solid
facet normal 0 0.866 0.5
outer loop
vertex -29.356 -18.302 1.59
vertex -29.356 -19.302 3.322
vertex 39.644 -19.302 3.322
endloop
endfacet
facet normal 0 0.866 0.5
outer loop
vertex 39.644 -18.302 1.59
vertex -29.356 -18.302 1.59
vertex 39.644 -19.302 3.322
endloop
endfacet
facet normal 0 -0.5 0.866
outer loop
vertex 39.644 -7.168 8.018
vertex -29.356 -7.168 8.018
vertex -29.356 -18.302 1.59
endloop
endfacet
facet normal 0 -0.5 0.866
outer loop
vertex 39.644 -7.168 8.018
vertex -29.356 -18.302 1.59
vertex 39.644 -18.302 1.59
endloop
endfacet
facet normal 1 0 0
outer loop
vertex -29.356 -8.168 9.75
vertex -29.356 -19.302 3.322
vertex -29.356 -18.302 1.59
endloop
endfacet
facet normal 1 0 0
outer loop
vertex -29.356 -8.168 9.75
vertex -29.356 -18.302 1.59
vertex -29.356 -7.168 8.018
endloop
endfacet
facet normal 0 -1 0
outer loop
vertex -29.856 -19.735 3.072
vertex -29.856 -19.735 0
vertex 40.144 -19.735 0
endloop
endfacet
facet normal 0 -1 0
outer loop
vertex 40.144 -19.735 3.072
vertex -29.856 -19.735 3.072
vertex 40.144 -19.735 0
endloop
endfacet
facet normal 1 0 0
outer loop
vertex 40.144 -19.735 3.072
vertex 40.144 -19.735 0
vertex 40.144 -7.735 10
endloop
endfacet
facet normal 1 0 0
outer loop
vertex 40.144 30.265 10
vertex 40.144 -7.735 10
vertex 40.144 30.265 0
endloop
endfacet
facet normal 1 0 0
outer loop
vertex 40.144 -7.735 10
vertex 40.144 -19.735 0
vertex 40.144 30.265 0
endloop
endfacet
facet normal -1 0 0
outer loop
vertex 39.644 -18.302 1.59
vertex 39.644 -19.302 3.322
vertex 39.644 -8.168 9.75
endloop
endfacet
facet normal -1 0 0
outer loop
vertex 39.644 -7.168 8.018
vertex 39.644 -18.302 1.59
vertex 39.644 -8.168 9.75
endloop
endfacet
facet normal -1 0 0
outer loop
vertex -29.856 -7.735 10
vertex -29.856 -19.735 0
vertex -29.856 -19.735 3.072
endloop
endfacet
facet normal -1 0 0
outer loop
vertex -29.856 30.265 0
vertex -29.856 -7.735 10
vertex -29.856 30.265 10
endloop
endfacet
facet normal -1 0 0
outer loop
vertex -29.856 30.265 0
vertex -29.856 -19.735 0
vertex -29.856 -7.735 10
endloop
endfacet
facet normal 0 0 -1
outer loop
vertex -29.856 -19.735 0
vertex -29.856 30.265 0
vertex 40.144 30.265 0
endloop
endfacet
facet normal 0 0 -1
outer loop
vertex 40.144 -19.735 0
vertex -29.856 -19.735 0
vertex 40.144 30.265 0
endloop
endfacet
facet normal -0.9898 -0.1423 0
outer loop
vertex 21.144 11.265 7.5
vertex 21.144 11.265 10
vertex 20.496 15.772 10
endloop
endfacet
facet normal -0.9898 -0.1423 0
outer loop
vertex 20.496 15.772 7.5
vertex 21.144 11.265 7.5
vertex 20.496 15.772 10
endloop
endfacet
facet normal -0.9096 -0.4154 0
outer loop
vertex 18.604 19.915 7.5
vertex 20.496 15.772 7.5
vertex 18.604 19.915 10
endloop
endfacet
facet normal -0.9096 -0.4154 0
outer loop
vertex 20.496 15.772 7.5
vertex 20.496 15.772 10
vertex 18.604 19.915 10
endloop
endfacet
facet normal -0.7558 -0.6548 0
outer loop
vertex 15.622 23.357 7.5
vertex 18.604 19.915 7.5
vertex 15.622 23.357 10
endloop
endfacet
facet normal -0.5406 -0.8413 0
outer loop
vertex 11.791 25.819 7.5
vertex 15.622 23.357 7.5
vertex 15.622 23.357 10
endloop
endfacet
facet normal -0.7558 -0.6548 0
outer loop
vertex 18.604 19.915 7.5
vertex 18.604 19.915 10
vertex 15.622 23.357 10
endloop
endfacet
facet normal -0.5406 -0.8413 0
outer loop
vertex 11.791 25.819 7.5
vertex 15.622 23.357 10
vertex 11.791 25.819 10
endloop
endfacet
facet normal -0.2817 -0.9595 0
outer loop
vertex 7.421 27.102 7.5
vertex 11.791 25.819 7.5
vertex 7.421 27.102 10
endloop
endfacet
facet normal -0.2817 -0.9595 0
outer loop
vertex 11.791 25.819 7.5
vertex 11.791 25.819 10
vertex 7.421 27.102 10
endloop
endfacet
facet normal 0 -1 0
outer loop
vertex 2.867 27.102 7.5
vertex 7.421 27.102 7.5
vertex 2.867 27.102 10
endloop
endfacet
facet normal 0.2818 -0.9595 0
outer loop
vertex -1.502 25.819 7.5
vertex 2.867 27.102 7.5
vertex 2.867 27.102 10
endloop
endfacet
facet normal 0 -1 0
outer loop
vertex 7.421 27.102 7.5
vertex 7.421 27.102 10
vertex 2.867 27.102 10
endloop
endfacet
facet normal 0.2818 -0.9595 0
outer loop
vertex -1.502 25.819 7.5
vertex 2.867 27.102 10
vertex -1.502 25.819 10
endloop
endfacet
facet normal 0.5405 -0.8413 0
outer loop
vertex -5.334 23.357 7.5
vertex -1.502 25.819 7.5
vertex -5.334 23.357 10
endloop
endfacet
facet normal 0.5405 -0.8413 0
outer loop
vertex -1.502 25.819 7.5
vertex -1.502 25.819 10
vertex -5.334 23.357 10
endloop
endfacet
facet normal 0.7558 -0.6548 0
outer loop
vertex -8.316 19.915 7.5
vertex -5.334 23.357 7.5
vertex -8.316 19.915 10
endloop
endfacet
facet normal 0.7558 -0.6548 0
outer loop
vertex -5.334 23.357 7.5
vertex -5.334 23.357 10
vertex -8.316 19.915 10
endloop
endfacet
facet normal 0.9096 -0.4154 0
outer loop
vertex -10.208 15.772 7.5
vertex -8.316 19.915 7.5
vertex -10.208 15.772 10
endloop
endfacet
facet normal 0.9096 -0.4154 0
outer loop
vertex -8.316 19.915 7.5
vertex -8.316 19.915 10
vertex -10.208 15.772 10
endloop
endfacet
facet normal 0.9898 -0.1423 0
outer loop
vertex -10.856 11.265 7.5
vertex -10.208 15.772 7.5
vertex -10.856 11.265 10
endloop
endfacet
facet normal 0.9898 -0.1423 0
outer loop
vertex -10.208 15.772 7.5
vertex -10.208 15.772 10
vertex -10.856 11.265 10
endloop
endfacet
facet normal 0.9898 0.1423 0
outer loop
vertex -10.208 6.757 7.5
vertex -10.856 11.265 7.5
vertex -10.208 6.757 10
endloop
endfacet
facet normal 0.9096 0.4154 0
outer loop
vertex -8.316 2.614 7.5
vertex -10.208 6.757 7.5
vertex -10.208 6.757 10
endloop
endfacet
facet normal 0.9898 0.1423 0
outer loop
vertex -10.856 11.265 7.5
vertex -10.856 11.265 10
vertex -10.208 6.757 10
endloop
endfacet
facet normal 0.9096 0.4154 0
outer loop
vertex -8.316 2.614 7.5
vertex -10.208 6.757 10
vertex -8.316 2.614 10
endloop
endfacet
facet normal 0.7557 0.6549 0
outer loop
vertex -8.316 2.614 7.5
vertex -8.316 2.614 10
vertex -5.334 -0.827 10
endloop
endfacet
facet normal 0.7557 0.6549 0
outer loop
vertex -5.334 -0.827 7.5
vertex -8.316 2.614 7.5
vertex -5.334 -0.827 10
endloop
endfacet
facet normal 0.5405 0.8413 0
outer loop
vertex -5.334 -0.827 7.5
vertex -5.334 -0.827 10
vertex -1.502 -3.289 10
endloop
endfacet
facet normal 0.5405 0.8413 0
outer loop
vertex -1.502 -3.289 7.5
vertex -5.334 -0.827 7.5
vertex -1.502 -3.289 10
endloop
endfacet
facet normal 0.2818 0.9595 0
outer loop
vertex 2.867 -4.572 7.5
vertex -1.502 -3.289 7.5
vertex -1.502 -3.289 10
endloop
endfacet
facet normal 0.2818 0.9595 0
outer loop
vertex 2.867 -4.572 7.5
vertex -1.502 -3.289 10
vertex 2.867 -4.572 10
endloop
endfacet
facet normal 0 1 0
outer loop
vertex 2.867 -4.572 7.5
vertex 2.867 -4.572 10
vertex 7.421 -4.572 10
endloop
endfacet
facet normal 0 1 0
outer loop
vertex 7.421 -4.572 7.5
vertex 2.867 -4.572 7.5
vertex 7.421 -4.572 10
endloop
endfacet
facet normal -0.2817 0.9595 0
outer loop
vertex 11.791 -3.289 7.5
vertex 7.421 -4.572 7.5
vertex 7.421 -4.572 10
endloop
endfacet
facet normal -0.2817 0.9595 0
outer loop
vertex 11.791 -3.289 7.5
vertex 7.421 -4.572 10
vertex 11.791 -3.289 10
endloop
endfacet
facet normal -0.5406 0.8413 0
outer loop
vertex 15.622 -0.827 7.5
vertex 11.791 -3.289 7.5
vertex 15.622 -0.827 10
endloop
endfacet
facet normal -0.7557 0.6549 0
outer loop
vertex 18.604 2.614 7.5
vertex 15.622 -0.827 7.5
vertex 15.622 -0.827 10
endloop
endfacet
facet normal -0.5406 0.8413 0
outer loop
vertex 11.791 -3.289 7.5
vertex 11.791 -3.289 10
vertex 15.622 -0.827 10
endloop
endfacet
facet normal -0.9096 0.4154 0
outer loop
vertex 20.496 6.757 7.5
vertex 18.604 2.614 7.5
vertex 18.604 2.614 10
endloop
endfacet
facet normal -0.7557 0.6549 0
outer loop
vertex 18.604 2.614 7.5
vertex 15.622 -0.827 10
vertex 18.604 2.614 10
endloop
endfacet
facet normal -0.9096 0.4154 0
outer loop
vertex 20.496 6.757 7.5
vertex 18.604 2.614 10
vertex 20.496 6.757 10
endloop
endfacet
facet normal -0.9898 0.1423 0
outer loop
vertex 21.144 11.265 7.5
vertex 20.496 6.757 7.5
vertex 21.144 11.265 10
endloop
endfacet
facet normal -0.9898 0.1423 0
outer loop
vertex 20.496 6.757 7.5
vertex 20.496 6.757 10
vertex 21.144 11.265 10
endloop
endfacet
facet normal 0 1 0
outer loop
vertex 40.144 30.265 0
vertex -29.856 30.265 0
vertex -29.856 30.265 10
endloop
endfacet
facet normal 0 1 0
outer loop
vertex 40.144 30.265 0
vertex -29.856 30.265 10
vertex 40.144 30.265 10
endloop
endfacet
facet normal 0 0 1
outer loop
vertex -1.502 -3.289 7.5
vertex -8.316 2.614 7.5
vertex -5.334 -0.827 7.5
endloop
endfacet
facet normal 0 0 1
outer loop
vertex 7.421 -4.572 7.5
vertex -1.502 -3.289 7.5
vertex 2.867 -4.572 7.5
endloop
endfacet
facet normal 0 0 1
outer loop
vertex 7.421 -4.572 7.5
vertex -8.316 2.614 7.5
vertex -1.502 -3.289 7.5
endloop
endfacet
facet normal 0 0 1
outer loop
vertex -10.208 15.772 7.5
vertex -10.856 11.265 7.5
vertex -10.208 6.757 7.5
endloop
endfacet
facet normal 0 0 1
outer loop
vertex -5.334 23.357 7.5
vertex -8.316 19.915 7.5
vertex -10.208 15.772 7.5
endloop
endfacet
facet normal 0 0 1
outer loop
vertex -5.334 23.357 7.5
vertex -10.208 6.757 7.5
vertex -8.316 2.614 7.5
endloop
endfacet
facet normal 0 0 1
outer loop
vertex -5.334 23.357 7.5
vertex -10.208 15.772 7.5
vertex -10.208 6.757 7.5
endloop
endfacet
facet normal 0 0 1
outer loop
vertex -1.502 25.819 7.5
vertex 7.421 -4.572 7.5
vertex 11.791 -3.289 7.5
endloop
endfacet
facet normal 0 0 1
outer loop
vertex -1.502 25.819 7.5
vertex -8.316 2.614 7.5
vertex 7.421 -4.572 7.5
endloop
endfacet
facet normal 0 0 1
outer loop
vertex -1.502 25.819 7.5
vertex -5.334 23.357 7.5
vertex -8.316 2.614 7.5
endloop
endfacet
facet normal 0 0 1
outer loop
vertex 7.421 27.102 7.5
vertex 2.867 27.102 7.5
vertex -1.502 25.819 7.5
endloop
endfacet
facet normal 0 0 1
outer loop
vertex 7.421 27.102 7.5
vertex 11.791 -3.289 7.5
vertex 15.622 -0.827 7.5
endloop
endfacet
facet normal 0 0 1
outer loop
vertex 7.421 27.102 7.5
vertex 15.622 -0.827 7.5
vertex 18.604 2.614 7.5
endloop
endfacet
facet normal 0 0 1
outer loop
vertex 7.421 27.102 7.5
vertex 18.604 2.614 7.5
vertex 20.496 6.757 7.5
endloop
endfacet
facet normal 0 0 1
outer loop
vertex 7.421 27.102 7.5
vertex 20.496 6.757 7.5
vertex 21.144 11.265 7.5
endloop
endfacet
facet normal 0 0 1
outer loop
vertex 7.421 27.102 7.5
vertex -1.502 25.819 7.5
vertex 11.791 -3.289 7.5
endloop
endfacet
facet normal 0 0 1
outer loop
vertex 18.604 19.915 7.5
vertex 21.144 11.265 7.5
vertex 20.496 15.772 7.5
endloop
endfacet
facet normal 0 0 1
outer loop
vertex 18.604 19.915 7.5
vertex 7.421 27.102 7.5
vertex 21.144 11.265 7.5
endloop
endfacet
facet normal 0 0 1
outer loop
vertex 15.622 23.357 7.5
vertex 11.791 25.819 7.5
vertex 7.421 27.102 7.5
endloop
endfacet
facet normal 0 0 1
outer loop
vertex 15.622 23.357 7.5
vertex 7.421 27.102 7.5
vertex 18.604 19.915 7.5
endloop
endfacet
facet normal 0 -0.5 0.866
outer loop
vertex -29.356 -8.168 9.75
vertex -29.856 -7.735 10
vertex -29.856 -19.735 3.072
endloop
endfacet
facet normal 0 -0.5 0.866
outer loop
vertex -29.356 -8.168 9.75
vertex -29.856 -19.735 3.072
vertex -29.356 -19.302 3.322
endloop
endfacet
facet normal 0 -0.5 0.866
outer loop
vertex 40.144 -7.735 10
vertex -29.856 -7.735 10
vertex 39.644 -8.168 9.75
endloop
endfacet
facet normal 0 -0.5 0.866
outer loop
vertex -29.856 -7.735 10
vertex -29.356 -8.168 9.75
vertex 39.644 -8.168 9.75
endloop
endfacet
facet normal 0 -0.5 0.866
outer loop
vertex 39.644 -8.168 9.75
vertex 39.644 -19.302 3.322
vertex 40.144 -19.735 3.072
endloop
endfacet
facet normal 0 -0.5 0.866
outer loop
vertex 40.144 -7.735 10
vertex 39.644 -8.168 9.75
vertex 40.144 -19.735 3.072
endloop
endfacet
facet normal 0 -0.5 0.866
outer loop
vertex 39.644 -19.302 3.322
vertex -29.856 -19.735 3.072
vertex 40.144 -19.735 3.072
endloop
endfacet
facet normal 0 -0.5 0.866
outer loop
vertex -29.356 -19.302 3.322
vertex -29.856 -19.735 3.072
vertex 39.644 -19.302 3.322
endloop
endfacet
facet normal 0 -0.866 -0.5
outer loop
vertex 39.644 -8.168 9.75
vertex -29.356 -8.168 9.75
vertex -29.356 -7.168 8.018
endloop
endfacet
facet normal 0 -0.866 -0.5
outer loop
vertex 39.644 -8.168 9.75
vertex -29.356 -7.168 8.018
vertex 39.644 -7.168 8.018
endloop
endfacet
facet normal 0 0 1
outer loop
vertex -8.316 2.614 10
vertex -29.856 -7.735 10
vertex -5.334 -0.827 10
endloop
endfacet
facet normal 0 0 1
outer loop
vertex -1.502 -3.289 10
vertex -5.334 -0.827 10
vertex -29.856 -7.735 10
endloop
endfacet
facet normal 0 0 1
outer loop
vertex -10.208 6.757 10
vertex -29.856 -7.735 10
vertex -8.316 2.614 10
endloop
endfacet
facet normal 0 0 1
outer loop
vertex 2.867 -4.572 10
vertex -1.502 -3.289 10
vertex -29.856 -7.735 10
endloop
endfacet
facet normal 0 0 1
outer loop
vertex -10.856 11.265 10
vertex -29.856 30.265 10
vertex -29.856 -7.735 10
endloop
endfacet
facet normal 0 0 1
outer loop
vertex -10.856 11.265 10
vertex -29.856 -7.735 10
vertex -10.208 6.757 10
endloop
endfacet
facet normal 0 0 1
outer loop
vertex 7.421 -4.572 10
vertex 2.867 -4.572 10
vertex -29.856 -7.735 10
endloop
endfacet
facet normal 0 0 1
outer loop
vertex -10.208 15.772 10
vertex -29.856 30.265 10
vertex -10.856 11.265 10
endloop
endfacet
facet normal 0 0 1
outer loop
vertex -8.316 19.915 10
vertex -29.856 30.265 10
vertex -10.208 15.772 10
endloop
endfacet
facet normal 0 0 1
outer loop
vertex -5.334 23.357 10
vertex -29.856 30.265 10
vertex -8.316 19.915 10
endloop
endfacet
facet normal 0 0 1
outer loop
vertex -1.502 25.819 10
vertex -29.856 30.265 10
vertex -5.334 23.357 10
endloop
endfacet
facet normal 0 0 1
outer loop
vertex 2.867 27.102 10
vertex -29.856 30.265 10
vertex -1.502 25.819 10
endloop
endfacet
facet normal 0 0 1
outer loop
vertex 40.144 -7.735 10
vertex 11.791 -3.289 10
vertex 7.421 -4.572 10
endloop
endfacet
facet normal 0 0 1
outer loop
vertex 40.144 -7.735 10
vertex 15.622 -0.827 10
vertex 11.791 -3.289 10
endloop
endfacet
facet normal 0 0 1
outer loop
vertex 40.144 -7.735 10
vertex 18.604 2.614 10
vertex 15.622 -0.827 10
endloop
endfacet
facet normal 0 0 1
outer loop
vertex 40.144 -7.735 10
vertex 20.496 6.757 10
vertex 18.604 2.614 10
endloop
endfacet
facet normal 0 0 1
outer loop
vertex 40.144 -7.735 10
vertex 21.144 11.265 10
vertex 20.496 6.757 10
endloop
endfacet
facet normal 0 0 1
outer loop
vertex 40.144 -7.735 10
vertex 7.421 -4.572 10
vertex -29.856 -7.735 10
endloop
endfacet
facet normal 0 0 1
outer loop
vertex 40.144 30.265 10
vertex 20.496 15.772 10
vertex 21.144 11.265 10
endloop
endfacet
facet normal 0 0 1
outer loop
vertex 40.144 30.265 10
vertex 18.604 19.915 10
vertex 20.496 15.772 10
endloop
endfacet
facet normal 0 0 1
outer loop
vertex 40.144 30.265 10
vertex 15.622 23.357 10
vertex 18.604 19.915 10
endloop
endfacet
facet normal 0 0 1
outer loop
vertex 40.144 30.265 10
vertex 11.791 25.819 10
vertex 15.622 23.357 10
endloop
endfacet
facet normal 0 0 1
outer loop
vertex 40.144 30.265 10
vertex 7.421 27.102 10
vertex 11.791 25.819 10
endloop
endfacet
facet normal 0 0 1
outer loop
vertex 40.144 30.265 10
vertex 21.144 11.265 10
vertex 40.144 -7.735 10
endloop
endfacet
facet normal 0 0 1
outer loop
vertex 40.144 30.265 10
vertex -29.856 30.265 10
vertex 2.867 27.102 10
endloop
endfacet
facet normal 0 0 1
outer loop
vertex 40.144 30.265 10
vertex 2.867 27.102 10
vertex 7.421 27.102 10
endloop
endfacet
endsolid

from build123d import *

# Parameters (mm, degrees)
F0_W     = 70
F0_H     = 50
F1_DEPTH = 10
F2_SIZE2 = 6.9282032303
F2_SIZE  = 12
F3_R     = 16
F4_DEPTH = 2.5
F5_W     = 69
F5_H     = 12.8564064606
F6_DEPTH = 2


with BuildPart() as f1:
    # F0 (on Top) → F1 (new body)
    with BuildSketch(Plane.XY):
        with Locations((5.1442100421, 5.2647431195)):
            Rectangle(F0_W, F0_H)
    extrude(amount=F1_DEPTH)

    # F2
    f2_edges = [f1.edges().sort_by_distance(p)[0] for p in [
        (5.14421, -19.735257, 10),
    ]]
    f2_side = f1.faces().sort_by_distance((5.14421, 5.264743, 10))[0]
    chamfer(f2_edges, length=F2_SIZE, length2=F2_SIZE2, reference=f2_side)

    # F3 (on face) → F4 (cut)
    with BuildSketch(Plane.XY.offset(10)):
        with Locations((5.1442100421, 11.2647431195)):
            Circle(F3_R)
    extrude(amount=-F4_DEPTH, mode=Mode.SUBTRACT)

    # F5 (on face) → F6 (cut)
    with BuildSketch(Plane(origin=(0, -6.2639412391, 10.8494644817), x_dir=(1, 0, 0), z_dir=(0, -0.5, 0.8660254038))):
        with Locations((5.1442100421, -8.6271321936)):
            Rectangle(F5_W, F5_H)
    extrude(amount=-F6_DEPTH, mode=Mode.SUBTRACT)


solid = f1.part
